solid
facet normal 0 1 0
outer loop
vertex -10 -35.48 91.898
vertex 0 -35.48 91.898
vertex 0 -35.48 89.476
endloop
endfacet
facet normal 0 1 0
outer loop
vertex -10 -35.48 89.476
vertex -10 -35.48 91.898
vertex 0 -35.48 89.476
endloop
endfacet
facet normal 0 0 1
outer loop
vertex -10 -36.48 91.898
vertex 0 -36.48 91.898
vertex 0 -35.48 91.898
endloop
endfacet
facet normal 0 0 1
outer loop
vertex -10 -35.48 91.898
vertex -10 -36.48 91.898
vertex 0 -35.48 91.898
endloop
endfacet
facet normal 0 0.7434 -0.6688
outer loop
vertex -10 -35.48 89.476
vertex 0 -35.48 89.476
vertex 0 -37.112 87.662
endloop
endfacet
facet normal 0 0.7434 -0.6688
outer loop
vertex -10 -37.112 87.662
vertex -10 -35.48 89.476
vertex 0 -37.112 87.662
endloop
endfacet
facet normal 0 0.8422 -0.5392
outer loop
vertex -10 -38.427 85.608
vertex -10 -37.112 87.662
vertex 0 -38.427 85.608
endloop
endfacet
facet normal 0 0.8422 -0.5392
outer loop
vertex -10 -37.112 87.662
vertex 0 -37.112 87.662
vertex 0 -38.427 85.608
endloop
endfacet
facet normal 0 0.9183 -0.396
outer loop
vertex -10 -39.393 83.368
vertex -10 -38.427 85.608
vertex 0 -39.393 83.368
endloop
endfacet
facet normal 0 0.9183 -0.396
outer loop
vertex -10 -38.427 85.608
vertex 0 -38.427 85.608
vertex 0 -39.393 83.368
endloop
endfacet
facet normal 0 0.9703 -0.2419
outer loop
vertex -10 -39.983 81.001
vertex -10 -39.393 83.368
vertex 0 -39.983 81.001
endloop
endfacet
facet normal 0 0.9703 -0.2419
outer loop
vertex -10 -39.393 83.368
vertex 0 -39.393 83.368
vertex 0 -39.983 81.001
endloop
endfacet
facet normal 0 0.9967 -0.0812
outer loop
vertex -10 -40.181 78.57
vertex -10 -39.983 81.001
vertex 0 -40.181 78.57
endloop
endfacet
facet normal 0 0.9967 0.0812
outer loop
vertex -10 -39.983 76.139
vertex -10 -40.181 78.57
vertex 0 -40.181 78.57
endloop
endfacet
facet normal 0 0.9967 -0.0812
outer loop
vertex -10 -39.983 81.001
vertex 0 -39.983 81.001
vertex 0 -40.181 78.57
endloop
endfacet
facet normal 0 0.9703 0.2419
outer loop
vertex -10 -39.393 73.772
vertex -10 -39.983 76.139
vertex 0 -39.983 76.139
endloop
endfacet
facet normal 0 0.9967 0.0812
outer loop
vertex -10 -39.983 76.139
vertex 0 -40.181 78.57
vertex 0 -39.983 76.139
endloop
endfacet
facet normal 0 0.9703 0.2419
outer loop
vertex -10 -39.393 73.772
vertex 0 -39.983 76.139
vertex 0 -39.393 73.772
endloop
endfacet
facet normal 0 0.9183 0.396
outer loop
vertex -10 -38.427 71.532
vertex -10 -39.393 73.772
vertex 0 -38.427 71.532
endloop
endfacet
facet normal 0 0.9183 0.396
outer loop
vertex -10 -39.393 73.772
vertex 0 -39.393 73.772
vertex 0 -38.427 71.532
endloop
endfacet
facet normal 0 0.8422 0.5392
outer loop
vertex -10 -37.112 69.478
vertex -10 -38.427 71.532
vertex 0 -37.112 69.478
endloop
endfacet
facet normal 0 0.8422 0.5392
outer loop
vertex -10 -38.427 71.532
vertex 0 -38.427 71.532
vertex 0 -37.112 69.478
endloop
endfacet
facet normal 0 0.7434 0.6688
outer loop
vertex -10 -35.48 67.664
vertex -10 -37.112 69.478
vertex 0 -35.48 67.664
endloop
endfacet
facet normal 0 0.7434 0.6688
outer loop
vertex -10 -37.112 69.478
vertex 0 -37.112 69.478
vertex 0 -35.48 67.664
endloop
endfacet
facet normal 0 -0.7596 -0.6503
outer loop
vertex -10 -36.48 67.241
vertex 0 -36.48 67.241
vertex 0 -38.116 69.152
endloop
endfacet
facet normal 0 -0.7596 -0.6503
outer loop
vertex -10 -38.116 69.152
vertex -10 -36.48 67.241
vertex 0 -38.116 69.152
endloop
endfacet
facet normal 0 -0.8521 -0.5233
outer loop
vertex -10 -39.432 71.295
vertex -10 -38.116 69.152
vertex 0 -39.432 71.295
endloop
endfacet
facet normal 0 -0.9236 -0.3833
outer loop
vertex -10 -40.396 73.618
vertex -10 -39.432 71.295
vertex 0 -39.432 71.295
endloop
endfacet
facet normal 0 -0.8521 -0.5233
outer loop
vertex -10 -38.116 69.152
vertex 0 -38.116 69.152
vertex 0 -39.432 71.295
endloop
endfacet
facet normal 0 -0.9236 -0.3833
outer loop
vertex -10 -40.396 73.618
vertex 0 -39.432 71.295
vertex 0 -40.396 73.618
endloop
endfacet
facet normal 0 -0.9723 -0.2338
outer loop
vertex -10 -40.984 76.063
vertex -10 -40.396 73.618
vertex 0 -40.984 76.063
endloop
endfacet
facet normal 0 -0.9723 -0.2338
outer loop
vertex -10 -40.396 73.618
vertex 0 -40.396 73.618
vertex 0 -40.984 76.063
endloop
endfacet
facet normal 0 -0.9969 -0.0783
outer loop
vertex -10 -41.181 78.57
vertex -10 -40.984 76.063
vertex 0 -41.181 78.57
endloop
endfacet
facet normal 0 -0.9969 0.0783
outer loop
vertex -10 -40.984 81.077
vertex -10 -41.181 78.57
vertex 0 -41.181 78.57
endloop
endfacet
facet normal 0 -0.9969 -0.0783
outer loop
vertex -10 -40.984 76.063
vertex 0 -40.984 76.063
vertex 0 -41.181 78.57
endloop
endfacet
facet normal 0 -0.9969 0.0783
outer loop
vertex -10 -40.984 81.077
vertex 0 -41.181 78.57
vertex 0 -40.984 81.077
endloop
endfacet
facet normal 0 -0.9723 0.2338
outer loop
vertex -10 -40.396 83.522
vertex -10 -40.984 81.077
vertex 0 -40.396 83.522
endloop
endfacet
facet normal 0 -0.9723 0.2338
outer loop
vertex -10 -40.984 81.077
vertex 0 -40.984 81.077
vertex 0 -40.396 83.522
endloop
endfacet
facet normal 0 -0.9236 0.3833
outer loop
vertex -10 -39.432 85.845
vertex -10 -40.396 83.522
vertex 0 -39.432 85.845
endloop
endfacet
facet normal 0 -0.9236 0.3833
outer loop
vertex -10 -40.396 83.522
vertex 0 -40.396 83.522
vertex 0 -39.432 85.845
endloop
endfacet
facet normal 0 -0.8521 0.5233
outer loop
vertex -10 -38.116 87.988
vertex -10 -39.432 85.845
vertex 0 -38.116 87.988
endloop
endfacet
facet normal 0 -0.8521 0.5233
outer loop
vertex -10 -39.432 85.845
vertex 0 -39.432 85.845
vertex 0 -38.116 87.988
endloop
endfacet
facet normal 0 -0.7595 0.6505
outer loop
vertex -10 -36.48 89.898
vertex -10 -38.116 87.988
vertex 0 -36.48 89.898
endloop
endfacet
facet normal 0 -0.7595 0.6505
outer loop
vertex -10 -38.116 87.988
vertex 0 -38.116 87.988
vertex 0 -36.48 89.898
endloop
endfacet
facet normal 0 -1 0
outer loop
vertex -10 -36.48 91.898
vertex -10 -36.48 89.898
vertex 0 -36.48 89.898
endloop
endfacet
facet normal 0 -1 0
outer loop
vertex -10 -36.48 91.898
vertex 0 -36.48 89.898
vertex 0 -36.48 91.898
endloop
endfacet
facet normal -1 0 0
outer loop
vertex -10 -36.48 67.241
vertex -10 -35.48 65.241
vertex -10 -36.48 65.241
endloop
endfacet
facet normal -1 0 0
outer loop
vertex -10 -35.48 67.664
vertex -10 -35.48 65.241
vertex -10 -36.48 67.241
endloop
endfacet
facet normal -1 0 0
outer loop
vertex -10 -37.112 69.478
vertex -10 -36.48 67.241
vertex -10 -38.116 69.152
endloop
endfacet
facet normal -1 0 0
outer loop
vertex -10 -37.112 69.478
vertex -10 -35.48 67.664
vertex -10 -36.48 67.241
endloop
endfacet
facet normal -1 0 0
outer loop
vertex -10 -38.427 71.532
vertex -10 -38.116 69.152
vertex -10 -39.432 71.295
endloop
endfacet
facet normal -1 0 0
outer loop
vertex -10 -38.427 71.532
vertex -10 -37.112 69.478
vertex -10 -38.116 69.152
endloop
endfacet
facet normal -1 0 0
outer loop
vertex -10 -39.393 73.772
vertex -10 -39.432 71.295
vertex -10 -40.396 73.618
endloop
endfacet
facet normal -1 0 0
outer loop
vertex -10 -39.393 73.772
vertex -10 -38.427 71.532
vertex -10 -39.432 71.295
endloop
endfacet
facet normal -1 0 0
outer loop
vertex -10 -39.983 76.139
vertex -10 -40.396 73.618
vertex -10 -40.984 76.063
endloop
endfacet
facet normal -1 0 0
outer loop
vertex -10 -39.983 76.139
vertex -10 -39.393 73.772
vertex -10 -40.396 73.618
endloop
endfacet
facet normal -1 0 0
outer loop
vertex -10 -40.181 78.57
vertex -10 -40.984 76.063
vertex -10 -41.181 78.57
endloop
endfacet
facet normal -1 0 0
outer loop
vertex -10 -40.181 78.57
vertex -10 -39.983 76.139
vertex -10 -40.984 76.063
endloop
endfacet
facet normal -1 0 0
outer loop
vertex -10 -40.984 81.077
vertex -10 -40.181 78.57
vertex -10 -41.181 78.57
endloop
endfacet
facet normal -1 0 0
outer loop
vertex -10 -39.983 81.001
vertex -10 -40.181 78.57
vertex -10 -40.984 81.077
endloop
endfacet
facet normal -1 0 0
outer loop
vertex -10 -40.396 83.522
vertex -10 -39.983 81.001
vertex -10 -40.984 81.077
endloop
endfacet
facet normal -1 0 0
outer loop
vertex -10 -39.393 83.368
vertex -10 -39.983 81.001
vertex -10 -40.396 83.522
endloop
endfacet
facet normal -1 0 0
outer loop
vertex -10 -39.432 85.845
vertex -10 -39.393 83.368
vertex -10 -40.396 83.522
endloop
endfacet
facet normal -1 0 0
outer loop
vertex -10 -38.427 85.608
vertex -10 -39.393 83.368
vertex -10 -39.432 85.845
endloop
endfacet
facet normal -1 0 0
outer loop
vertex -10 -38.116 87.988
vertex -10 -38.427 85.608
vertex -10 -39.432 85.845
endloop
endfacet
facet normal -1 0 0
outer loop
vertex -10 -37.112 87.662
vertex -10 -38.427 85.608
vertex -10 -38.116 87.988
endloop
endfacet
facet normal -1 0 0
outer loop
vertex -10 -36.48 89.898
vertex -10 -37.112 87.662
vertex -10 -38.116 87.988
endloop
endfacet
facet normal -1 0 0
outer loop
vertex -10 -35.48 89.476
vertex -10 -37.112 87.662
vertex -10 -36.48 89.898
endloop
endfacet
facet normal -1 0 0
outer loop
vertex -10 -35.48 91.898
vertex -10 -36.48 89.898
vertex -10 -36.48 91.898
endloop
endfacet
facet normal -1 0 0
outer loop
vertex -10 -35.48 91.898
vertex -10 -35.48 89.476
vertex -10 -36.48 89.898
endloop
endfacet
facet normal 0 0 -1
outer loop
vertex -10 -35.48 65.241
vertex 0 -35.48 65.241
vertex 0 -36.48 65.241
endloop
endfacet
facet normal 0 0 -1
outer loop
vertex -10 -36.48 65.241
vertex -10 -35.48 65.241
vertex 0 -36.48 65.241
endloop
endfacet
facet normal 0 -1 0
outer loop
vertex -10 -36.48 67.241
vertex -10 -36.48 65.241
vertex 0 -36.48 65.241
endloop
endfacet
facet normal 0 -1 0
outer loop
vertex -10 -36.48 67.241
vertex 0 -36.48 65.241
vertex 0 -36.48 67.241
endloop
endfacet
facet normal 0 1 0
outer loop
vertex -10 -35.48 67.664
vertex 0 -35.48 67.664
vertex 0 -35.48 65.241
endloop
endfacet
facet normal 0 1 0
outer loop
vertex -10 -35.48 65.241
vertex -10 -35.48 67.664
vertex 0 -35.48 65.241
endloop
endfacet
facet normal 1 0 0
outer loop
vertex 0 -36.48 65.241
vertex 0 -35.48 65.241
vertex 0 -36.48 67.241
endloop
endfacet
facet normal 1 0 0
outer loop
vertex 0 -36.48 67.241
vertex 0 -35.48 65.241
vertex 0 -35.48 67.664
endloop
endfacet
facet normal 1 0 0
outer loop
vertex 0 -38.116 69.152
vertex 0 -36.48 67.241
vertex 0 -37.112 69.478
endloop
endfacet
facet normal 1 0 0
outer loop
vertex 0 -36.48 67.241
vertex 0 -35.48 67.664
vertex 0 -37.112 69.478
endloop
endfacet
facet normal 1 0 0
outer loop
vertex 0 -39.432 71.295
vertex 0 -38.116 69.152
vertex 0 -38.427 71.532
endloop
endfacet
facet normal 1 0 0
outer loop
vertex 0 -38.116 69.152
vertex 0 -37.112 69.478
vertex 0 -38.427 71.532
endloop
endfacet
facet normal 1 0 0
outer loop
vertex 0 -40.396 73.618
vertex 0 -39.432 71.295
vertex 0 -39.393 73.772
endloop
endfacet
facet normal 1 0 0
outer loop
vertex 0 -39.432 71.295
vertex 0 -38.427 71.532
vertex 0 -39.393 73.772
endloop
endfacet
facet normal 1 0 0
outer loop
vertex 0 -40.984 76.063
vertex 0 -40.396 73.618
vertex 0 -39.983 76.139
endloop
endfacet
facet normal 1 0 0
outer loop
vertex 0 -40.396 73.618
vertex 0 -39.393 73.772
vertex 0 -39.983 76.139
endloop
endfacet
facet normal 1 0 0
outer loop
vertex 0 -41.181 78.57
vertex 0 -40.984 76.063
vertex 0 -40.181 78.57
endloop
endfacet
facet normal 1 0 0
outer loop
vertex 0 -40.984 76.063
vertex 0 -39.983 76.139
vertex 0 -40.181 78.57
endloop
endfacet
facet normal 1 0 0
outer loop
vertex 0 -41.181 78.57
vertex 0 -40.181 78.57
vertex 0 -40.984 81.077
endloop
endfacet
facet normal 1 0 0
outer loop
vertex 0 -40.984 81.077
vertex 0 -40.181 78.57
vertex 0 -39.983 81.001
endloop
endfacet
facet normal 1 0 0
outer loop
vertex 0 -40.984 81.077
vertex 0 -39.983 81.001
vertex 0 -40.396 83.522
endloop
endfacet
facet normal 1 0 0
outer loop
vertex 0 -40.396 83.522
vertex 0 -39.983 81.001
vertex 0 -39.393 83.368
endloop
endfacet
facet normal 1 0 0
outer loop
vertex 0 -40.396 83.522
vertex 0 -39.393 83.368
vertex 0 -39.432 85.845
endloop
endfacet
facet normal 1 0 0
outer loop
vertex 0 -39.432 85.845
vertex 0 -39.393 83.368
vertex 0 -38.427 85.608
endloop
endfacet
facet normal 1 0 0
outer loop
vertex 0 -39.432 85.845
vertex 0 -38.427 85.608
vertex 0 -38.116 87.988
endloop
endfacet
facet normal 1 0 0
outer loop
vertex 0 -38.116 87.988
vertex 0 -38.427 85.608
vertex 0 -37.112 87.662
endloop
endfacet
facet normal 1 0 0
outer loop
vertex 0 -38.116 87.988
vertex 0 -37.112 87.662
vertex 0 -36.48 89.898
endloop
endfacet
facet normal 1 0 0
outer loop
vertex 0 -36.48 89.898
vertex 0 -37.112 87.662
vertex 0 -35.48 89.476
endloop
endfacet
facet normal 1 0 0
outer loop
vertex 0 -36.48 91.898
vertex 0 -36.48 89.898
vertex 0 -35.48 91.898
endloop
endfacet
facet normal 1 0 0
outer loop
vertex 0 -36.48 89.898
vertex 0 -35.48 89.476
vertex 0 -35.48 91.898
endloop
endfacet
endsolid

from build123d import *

# Parameters (mm, degrees)
BOSS_EXTRU_1_DEPTH = 10


with BuildPart() as part:
    # Esquisse1 → Boss.-Extru.1 (new body)
    with BuildSketch(Plane(origin=(0, 0, 0), x_dir=(0, 0, -1), z_dir=(1, 0, 0))):
        with BuildLine():
            Line((-89.898468063, -36.480057998), (-91.898468063, -36.480057998))
            Line((-91.898468063, -36.480057998), (-91.898468063, -35.480057998))
            Line((-91.898468063, -35.480057998), (-89.475592066, -35.480057998))
            ThreePointArc((-89.475592066, -35.480057998), (-78.569905432, -40.181223159), (-67.664218798, -35.480057998))
            Line((-67.664218798, -35.480057998), (-65.241342801, -35.480057998))
            Line((-65.241342801, -35.480057998), (-65.241342801, -36.480057998))
            Line((-65.241342801, -36.480057998), (-67.241342801, -36.480057998))
            ThreePointArc((-67.241342801, -36.480057998), (-78.569905432, -41.181223159), (-89.898468063, -36.480057998))
        make_face()
    extrude(amount=-BOSS_EXTRU_1_DEPTH)


solid = part.part
